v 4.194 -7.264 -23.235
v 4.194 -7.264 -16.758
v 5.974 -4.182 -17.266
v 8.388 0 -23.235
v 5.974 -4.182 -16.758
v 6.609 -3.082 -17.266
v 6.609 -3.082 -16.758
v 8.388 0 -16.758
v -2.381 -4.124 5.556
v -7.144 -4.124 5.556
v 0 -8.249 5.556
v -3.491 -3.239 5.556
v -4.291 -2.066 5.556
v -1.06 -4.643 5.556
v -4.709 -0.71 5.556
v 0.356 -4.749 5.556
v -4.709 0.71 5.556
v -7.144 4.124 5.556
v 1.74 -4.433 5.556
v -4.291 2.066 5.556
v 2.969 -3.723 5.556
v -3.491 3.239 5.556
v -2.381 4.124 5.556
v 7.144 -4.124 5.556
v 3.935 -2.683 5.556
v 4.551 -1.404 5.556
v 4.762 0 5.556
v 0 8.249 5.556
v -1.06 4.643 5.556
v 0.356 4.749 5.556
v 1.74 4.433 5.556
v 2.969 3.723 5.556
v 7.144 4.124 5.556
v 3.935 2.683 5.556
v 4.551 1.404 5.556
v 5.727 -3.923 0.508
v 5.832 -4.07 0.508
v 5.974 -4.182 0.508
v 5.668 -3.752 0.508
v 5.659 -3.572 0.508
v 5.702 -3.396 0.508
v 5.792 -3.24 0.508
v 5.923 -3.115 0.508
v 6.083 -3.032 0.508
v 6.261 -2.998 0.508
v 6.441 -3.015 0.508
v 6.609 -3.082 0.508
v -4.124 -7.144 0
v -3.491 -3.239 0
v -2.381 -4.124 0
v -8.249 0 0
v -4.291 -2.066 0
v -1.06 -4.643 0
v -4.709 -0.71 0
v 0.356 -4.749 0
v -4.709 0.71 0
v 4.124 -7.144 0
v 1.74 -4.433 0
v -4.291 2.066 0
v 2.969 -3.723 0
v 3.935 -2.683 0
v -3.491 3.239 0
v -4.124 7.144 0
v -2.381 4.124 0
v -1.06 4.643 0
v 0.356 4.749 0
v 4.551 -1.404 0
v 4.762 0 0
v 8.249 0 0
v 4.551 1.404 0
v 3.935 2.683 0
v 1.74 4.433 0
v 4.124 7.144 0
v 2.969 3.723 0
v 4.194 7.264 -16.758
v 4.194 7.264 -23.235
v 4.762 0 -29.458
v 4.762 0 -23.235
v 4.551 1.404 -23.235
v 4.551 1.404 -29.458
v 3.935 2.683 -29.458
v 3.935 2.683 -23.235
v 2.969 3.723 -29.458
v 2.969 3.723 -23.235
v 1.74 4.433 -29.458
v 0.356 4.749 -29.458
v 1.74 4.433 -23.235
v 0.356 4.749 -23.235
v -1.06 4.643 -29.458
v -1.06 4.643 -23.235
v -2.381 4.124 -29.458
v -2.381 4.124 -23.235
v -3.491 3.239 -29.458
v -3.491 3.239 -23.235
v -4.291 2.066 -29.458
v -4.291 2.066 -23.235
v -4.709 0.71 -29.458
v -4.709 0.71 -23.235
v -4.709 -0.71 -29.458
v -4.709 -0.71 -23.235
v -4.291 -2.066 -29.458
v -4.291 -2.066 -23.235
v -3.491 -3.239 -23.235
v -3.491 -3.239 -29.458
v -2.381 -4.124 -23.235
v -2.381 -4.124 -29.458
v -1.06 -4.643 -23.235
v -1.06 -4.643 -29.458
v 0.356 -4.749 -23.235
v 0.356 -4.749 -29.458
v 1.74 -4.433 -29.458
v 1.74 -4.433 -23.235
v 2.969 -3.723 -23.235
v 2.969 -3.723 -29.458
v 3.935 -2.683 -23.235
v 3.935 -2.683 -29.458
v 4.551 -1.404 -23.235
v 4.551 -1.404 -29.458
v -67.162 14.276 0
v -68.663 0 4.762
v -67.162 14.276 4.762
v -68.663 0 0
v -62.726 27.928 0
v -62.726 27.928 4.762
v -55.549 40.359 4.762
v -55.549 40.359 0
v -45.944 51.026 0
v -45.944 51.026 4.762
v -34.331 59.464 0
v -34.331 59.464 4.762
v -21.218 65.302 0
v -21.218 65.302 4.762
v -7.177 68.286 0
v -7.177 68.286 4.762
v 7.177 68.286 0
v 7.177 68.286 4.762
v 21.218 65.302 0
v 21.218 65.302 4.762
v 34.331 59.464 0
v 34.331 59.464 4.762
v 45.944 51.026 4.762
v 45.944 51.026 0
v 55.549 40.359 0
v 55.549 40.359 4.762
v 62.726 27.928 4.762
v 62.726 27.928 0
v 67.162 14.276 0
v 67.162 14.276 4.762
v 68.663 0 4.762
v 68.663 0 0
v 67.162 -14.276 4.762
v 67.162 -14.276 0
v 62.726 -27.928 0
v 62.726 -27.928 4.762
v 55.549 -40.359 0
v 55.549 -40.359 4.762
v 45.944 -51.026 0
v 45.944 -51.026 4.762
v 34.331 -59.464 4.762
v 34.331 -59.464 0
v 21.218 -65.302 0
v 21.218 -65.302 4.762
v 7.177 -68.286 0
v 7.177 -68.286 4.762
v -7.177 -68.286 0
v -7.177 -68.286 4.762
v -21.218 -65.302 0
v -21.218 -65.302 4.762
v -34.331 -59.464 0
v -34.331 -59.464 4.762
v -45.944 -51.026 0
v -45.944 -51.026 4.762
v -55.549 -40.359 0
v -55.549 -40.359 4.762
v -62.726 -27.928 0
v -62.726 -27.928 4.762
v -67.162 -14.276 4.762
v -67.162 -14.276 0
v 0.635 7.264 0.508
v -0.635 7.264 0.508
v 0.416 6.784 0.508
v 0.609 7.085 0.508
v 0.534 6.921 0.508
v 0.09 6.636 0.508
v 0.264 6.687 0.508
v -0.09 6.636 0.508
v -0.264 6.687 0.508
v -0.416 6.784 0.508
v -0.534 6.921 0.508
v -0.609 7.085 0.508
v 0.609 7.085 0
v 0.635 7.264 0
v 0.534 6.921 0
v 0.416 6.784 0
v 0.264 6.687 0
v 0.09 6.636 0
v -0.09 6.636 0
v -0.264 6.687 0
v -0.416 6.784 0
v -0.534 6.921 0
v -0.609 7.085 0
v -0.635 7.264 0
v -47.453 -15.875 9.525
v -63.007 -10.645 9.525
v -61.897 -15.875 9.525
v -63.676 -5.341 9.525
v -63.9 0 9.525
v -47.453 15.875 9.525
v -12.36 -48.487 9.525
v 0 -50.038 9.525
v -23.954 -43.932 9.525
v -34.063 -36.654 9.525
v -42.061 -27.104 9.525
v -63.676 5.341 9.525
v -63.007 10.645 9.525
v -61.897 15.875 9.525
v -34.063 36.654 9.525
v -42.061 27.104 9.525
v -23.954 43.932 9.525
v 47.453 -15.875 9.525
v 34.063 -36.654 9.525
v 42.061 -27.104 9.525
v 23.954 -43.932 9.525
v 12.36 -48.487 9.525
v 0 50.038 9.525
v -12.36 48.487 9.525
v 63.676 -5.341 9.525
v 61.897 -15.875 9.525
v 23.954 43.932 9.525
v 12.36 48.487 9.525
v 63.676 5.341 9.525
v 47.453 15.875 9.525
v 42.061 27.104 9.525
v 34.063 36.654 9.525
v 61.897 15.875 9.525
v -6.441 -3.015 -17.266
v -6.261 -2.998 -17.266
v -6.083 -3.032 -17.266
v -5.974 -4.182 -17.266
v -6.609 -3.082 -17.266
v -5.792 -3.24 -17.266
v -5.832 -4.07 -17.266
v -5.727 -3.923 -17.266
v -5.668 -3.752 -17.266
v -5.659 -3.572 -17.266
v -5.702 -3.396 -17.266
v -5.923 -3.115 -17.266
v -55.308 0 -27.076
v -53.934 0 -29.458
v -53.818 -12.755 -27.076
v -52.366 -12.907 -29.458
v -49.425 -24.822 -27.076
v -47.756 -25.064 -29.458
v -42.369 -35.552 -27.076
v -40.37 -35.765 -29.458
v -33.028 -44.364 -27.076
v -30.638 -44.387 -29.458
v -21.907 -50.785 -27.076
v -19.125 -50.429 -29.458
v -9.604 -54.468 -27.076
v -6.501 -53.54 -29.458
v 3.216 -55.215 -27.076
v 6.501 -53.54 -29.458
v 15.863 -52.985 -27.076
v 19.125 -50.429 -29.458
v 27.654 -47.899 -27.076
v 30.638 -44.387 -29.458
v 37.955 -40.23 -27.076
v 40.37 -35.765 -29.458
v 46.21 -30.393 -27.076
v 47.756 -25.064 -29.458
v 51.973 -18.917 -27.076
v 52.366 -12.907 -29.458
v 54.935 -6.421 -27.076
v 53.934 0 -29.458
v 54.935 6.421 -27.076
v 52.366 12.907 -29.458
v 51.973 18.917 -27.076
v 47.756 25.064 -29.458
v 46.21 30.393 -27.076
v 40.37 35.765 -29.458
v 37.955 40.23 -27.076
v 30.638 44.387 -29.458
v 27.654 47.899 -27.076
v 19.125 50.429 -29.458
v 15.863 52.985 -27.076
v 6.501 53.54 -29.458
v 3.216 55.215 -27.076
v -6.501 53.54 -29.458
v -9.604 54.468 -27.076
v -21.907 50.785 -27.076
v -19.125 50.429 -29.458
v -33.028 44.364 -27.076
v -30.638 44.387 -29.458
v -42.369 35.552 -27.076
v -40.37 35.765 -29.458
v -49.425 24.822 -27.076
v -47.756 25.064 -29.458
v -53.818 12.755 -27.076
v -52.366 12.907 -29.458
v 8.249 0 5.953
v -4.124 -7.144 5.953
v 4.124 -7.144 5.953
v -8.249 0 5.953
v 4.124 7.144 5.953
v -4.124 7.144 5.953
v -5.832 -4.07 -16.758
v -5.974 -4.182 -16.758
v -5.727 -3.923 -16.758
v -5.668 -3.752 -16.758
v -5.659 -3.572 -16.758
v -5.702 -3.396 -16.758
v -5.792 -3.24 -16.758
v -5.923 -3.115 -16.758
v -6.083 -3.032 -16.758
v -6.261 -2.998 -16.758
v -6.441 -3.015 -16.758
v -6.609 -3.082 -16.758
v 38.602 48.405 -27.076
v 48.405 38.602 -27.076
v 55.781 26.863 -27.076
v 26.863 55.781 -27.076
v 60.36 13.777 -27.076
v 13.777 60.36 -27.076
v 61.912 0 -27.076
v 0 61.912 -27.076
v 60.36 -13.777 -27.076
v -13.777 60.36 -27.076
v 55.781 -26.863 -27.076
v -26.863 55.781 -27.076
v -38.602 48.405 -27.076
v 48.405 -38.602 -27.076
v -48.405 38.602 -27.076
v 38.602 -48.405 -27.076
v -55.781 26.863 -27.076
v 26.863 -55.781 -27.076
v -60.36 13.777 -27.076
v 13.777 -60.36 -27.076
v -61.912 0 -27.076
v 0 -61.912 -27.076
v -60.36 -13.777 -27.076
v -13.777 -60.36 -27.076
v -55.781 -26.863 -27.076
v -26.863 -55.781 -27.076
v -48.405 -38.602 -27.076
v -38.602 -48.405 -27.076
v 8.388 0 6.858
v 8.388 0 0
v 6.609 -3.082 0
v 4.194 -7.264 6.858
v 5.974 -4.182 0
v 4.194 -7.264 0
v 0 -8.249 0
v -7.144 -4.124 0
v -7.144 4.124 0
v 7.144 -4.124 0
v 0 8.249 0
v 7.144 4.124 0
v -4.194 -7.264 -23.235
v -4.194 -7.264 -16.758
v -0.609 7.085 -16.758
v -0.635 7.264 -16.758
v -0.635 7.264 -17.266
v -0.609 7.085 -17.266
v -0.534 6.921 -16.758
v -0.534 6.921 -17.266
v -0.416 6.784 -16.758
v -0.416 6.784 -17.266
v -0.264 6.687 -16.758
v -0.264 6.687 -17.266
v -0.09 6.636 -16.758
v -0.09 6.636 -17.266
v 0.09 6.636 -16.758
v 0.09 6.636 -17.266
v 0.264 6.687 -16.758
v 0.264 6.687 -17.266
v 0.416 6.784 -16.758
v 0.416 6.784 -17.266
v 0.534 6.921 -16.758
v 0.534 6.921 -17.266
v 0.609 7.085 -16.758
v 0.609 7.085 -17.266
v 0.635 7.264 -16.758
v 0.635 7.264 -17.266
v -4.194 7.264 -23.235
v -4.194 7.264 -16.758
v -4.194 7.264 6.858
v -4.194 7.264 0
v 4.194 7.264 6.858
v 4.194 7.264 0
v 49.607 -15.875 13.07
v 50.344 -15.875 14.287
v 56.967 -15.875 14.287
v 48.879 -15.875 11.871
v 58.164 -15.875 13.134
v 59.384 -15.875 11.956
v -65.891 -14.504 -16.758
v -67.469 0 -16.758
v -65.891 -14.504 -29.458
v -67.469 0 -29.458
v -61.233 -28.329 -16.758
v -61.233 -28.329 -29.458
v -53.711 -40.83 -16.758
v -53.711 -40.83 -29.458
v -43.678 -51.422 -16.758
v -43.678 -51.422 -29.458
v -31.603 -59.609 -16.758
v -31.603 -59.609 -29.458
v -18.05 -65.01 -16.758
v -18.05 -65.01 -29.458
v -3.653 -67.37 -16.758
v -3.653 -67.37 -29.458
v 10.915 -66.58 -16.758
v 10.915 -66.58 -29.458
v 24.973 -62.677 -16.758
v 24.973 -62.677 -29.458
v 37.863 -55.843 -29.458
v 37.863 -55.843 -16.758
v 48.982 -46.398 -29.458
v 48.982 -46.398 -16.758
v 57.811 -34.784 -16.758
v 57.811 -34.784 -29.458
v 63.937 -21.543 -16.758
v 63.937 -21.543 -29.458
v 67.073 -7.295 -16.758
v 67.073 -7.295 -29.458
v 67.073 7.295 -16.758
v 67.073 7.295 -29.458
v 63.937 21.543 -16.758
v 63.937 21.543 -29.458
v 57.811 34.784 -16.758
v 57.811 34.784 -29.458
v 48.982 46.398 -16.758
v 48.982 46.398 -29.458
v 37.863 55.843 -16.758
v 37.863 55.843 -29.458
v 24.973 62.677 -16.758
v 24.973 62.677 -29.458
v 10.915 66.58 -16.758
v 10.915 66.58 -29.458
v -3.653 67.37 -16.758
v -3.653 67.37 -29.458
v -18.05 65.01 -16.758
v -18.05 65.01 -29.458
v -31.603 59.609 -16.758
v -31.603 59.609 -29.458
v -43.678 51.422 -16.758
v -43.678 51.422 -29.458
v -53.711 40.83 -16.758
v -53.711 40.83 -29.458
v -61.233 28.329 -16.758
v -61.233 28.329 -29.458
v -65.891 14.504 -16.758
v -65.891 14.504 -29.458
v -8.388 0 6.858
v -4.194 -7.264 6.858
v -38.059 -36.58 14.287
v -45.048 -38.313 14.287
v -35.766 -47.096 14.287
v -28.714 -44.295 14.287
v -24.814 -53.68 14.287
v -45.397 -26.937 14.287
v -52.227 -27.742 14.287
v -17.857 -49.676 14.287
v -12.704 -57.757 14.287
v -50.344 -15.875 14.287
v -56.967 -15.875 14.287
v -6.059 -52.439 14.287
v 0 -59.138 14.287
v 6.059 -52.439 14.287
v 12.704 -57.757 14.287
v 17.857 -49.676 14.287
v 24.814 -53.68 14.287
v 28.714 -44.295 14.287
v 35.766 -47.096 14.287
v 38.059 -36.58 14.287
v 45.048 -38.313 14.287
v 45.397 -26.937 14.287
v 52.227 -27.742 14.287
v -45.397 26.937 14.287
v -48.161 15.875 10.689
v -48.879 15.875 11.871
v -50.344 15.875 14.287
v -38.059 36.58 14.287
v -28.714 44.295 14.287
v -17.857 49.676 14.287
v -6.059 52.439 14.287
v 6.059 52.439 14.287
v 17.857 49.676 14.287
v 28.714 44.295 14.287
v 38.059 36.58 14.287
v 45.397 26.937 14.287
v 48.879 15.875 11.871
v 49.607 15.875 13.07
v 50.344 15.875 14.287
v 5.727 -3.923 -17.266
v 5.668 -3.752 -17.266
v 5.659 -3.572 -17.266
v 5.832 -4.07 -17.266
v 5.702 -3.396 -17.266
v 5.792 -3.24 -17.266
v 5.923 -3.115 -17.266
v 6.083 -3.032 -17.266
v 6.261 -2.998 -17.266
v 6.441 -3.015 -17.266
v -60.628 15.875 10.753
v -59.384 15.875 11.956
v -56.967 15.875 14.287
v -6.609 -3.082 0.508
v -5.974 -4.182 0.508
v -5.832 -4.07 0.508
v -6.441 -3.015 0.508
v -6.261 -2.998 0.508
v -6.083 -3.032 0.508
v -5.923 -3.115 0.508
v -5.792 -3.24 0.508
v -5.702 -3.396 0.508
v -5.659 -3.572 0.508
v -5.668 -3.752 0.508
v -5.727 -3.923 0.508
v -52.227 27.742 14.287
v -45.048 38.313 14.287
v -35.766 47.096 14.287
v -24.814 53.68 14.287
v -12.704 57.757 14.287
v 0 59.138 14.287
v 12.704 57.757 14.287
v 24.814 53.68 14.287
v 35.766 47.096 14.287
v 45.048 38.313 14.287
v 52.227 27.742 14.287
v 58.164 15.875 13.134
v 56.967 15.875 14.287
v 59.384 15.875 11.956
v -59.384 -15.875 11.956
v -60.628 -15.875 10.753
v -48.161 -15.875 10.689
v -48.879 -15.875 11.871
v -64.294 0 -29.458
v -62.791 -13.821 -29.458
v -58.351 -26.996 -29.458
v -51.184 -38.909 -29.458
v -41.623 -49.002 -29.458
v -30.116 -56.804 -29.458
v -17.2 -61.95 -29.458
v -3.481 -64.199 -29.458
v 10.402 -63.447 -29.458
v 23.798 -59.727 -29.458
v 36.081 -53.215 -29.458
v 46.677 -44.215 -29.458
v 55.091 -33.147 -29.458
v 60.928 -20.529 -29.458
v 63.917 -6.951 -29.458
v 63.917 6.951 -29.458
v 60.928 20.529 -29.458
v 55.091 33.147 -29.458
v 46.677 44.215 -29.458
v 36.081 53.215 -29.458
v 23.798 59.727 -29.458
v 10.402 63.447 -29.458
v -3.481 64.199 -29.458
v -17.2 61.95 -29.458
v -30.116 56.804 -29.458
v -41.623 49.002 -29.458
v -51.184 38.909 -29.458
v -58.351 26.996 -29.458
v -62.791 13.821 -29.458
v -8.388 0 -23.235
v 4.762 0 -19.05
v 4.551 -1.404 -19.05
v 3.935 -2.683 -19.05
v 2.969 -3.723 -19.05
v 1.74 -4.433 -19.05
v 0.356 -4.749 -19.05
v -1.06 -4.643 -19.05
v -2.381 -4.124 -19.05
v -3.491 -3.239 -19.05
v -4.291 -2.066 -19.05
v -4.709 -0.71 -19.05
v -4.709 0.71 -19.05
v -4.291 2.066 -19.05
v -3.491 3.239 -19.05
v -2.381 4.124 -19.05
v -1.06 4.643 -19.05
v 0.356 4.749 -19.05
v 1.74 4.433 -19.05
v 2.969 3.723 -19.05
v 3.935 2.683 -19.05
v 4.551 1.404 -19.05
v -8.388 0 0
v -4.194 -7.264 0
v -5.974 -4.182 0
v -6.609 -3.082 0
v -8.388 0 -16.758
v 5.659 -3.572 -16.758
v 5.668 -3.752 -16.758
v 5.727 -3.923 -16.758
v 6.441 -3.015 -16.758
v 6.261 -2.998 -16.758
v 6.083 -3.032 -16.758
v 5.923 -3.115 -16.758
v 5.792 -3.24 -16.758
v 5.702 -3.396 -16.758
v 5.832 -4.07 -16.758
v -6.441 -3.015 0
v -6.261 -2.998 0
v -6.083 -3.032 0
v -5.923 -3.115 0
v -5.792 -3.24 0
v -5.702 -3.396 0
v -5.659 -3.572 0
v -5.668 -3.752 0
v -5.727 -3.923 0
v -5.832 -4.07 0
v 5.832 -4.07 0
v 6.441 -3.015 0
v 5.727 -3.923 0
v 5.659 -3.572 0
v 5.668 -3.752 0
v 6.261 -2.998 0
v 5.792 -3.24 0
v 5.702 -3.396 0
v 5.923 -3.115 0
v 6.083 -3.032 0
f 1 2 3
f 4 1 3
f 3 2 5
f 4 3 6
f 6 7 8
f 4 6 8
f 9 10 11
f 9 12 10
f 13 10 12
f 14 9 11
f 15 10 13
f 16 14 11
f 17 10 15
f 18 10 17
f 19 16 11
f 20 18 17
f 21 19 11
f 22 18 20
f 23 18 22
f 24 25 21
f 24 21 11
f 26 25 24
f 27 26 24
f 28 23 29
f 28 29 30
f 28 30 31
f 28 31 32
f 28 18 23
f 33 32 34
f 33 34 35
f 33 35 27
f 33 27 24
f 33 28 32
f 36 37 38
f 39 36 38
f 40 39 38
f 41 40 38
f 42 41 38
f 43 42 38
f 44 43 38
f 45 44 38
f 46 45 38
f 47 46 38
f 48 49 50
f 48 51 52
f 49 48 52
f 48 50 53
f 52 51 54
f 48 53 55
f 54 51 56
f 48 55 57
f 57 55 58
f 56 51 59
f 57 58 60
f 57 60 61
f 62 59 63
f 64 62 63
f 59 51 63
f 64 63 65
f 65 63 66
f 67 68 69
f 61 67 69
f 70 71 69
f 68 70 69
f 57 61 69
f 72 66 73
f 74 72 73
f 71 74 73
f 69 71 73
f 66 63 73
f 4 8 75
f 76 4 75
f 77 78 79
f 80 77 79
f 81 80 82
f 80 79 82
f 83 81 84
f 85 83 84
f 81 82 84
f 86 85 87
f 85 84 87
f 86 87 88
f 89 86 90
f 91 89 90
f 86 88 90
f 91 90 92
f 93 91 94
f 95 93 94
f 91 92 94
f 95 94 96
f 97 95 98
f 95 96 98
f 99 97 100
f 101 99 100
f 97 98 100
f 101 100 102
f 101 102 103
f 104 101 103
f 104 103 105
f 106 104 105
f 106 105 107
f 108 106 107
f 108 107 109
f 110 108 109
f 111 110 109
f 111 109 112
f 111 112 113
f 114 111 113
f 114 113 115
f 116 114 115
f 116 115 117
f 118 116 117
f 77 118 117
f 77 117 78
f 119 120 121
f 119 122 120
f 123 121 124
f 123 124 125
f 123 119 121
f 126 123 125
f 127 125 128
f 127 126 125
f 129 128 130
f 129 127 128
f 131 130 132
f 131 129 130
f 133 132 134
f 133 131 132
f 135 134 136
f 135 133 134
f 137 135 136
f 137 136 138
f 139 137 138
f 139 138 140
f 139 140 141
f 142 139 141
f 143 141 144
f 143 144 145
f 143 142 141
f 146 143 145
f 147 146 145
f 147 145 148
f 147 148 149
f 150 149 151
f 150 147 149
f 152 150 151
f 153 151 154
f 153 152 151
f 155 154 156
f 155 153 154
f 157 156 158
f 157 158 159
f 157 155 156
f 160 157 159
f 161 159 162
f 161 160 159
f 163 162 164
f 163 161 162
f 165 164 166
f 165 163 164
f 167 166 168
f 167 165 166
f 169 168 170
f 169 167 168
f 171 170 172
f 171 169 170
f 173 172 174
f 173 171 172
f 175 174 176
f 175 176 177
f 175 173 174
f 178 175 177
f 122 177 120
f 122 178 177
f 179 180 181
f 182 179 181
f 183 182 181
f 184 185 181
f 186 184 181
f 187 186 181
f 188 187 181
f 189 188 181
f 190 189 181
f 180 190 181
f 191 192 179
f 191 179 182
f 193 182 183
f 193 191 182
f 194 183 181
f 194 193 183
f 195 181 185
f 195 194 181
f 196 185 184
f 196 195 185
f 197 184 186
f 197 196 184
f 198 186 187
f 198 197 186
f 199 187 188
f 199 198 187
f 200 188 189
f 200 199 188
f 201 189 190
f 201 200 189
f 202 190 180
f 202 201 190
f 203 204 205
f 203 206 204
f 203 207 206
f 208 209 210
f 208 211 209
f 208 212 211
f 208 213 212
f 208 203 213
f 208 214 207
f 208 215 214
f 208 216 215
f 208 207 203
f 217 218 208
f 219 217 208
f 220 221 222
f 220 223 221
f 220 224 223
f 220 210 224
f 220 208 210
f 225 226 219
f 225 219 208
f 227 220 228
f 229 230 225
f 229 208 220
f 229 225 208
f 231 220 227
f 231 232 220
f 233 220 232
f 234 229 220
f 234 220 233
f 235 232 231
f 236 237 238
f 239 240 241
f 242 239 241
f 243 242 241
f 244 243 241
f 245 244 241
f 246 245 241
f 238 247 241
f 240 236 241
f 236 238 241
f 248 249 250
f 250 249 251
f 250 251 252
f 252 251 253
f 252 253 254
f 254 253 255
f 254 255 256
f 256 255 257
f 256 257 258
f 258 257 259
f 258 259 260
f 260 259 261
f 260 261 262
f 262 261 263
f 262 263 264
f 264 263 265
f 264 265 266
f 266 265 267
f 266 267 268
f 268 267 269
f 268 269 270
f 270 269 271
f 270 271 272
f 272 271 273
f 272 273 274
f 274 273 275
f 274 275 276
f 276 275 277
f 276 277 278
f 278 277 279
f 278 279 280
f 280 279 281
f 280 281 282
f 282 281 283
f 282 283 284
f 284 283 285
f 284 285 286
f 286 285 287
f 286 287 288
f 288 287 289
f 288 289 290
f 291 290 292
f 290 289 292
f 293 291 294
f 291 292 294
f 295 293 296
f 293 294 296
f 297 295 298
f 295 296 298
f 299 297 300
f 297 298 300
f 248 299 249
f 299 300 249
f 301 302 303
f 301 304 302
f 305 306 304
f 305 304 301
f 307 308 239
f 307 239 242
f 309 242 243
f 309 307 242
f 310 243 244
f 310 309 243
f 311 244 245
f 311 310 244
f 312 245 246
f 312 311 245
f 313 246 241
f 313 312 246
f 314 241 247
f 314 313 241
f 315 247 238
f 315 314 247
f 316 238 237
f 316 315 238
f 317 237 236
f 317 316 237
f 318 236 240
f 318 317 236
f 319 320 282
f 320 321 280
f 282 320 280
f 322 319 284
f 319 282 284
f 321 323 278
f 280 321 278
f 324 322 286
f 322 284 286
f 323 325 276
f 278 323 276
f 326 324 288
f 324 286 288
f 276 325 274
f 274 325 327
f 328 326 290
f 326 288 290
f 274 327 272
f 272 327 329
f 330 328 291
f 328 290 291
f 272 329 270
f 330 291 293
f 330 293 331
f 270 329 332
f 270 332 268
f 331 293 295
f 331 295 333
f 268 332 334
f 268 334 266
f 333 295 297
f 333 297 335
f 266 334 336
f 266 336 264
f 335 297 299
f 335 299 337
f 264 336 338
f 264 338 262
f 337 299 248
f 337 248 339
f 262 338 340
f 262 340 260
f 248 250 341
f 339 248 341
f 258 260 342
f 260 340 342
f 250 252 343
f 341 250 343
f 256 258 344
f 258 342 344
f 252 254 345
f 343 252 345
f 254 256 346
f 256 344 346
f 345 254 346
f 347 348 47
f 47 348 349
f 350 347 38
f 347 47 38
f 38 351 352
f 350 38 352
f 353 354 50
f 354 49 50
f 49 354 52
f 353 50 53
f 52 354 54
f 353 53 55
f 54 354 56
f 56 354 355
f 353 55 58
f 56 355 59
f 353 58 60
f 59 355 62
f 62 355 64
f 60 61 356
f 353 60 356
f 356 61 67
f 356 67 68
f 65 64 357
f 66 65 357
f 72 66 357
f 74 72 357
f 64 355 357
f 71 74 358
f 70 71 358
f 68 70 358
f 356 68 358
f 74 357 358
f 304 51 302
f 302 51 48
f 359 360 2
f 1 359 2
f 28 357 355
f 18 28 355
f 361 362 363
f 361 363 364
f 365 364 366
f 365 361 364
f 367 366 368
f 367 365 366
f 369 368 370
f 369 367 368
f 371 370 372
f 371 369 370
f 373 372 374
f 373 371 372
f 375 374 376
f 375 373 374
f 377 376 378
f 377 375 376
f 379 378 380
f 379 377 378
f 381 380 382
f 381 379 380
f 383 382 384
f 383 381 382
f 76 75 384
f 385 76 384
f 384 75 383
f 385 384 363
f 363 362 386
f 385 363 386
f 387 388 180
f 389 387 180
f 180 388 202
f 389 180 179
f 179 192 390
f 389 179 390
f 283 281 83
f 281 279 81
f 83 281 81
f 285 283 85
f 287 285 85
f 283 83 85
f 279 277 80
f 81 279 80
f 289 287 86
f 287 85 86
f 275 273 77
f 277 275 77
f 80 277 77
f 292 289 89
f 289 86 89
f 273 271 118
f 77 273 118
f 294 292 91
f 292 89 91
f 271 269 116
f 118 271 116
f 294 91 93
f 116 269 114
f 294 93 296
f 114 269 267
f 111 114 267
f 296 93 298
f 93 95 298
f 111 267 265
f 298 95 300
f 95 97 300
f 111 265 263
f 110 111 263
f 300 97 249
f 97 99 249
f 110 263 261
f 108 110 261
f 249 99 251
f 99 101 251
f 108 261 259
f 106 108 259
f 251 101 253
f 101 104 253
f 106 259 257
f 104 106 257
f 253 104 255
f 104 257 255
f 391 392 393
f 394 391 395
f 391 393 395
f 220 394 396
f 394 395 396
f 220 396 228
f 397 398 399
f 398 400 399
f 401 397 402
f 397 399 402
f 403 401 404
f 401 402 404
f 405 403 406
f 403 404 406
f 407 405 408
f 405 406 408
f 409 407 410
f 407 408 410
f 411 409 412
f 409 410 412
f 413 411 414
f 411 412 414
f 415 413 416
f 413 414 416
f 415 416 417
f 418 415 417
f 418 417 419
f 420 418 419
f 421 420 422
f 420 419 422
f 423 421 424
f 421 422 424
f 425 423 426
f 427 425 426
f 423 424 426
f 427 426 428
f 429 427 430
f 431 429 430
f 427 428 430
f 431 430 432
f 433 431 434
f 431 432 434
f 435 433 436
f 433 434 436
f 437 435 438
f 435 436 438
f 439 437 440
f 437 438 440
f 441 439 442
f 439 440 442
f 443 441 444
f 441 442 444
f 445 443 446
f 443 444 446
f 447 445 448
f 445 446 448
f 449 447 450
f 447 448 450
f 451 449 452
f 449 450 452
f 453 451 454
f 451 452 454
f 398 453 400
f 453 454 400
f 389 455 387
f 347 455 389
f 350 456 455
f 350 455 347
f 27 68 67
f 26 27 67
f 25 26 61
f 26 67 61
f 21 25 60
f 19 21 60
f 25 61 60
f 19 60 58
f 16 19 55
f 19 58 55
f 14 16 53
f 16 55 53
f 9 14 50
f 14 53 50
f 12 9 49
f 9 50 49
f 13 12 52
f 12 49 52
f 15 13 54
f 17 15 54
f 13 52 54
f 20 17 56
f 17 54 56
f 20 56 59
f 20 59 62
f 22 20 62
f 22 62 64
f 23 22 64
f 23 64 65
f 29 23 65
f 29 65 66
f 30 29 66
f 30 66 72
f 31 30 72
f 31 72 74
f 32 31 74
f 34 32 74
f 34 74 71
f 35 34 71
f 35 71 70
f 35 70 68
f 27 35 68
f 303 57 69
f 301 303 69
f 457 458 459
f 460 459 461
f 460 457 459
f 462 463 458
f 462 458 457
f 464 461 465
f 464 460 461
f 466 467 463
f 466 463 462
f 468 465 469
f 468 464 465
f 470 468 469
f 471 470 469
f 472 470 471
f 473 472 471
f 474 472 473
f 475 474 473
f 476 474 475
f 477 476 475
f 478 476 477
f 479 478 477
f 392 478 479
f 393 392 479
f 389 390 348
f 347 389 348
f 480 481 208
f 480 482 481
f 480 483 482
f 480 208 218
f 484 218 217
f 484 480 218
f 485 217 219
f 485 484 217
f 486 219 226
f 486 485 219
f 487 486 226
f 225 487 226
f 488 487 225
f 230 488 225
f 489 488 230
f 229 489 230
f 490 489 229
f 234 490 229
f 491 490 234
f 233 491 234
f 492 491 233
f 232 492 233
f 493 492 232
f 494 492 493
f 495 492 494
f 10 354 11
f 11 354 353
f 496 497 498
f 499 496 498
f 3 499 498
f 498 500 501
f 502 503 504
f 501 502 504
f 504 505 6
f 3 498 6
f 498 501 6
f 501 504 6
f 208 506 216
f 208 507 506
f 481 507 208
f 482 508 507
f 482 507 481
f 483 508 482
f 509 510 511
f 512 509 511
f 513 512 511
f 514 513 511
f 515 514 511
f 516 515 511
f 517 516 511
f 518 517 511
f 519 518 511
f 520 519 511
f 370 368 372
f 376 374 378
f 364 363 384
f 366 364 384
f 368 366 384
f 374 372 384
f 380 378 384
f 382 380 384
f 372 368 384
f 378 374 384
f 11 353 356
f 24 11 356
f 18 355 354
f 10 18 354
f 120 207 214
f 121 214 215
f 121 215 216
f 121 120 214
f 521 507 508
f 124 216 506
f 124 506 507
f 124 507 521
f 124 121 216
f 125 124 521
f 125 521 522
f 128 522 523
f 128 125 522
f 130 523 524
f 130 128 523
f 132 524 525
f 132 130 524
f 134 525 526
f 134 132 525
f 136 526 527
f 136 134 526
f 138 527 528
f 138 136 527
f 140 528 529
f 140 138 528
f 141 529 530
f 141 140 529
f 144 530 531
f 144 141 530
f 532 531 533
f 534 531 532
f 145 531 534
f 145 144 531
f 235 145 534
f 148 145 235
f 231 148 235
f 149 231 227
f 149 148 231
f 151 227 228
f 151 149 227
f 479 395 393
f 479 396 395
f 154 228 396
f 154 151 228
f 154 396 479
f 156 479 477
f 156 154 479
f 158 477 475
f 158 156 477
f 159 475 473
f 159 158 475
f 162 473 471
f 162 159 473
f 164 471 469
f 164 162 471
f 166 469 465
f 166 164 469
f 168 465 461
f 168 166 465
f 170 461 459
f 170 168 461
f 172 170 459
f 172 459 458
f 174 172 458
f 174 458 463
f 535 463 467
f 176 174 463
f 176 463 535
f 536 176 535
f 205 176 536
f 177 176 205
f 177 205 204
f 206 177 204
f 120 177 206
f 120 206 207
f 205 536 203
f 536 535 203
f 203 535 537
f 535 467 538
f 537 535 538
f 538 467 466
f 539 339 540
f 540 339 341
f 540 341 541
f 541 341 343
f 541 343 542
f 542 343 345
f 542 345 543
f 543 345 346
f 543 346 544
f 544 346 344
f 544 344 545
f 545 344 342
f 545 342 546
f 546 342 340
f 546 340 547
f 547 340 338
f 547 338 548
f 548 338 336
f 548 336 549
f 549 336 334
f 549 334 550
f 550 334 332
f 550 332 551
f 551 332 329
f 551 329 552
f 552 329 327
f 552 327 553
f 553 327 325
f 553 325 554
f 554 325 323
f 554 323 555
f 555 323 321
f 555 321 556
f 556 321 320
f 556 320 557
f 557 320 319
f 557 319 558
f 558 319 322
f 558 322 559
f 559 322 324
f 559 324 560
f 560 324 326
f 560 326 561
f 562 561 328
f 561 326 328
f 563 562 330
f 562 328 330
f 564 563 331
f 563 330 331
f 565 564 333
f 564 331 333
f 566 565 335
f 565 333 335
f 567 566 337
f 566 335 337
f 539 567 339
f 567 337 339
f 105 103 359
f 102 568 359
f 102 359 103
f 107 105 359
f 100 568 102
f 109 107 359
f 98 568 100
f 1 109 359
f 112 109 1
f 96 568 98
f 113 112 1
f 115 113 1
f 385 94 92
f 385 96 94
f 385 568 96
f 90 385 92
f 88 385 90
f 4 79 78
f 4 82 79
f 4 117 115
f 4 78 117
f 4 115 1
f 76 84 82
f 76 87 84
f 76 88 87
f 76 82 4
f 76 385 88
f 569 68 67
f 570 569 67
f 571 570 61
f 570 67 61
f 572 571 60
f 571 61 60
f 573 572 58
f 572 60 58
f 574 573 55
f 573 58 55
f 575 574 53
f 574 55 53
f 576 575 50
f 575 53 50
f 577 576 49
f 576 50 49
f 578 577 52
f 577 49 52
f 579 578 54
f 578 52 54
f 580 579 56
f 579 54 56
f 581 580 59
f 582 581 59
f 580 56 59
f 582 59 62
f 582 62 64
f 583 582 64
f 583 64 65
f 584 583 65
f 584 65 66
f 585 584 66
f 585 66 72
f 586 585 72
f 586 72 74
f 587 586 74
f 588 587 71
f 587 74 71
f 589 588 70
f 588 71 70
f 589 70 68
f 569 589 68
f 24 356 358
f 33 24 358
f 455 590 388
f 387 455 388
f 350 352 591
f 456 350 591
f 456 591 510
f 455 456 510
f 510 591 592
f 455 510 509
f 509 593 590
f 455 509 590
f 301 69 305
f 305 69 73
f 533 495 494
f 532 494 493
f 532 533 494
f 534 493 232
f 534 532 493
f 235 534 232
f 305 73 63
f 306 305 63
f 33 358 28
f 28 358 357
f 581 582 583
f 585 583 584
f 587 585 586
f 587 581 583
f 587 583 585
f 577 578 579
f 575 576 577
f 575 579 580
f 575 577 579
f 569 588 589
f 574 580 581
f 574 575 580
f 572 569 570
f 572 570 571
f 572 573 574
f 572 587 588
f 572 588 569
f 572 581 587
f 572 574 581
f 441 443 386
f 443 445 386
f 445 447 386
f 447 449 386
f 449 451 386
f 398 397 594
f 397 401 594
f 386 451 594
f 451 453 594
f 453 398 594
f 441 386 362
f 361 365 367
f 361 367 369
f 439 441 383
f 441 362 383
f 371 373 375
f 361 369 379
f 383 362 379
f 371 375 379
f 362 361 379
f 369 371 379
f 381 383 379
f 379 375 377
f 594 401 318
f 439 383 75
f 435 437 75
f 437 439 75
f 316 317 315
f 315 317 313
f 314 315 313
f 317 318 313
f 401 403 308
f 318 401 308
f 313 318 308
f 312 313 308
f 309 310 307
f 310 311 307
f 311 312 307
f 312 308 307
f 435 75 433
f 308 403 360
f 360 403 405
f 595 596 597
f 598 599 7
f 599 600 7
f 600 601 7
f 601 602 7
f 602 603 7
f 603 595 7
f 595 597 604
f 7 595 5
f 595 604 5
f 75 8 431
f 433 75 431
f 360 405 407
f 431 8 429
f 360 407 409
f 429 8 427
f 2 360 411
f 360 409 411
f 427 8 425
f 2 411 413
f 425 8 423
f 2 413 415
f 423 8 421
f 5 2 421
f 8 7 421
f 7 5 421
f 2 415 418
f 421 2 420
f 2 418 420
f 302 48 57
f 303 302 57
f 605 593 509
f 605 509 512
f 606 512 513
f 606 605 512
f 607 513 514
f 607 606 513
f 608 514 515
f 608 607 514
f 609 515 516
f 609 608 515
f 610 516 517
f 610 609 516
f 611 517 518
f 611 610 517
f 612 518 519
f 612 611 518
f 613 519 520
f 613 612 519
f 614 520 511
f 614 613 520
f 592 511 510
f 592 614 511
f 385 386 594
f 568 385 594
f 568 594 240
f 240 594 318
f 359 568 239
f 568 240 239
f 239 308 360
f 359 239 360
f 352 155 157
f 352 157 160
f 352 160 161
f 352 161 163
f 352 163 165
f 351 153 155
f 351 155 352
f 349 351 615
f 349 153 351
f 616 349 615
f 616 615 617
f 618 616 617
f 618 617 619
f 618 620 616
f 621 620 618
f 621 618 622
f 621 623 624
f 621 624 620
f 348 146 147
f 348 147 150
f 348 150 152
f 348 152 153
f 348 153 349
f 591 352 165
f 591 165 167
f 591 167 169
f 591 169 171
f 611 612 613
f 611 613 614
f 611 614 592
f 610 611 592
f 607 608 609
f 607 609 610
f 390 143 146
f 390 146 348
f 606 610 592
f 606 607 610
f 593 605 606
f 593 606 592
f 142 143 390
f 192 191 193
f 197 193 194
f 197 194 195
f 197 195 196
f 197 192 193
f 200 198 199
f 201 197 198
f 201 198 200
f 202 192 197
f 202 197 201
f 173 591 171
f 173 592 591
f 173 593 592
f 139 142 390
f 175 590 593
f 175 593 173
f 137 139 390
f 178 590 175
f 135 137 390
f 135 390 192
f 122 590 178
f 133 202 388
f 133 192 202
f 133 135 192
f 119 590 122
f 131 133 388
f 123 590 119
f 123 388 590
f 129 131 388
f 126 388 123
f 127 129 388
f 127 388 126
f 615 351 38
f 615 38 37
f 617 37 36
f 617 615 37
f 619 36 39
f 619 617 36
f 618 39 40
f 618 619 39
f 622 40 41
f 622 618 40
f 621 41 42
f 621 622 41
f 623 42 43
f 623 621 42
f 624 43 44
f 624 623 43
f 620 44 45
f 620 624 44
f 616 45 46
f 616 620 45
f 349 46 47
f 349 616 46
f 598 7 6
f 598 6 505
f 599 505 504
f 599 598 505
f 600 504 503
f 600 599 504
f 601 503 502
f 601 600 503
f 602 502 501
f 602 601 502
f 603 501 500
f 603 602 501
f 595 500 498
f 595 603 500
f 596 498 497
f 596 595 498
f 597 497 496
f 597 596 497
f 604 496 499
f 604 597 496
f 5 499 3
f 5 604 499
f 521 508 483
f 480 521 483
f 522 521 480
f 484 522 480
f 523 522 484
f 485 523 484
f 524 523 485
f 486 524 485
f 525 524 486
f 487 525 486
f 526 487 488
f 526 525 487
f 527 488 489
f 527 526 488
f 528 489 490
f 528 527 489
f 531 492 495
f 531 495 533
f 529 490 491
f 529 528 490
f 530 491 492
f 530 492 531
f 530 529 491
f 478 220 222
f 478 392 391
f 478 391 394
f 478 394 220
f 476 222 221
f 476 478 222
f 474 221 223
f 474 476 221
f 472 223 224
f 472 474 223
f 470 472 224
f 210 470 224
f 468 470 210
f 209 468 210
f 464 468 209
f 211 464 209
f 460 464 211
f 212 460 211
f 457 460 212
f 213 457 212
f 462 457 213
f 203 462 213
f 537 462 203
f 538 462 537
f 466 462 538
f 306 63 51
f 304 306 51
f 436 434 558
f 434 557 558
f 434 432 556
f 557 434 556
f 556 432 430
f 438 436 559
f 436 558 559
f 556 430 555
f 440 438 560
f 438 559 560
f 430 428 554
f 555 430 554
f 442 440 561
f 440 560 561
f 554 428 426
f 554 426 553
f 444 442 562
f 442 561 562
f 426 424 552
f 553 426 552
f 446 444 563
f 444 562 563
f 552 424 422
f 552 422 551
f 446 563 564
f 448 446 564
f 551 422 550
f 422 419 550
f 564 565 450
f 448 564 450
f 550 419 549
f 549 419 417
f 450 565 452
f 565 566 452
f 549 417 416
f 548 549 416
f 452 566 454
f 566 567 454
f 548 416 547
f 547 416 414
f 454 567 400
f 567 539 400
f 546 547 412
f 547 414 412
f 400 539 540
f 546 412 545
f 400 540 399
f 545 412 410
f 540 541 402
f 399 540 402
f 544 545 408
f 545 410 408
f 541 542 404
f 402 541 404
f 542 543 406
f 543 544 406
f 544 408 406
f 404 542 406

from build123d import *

# Parameters (mm, degrees)
F5_DEPTH  = 6.858
F7_DEPTH  = 6.477
F8_R      = 4.7625
F9_DEPTH  = 12.701
F10_W     = 165.1
F10_H     = 31.75
F11_DEPTH = 4.7625
F13_DEPTH = 0.508
F15_DEPTH = 0.508
F17_DEPTH = 5.953125
F18_R     = 4.7625
F19_DEPTH = 19.05
F21_DEPTH = 5.55625
F22_R     = 4.7625
F23_DEPTH = 14.2885


with BuildPart() as f1:
    # F0 (on Front) → F1 (revolve)
    with BuildSketch(Plane.XZ):
        Polygon((-59.137630657, 14.2875), (-68.662630657, 4.7625), (-68.662630657, 0), (0, 0), (0, 9.525), (-50.038, 9.525), (-52.787630657, 14.2875), align=None)
    revolve(axis=Axis((0, 0, 4.7625), (0, 0, -1)))

    # F4 (on face) → F5 (cut)
    with BuildSketch(Plane(origin=(0, 0, 0), x_dir=(1, 0, 0), z_dir=(0, 0, -1))):
        Polygon((-4.1941032955, -7.2644), (4.1941032955, -7.2644), (8.388206591, 0), (4.1941032955, 7.2644), (-4.1941032955, 7.2644), (-8.388206591, 0), align=None)
    extrude(amount=-F5_DEPTH, mode=Mode.SUBTRACT)

    # F10 (on face) → F11 (cut)
    with BuildSketch(Plane.XY.offset(14.2875)):
        Rectangle(F10_W, F10_H)
    extrude(amount=-F11_DEPTH, mode=Mode.SUBTRACT)

    # F12 (on face) → F13 (join)
    with BuildSketch(Plane(origin=(0, 0, 0), x_dir=(1, 0, 0), z_dir=(0, 0, -1))):
        with BuildLine():
            Line((-5.9736549433, 4.1821261314), (-6.6086549433, 3.0822738686))
            ThreePointArc((-6.6086549433, 3.0822738686), (-5.7412288118, 3.3147), (-5.9736549433, 4.1821261314))
        make_face()
        with BuildLine():
            Line((-0.635, -7.2644), (0.635, -7.2644))
            ThreePointArc((0.635, -7.2644), (0, -6.6294), (-0.635, -7.2644))
        make_face()
        with BuildLine():
            Line((6.6086549433, 3.0822738686), (5.9736549433, 4.1821261314))
            ThreePointArc((5.9736549433, 4.1821261314), (5.7412288118, 3.3147), (6.6086549433, 3.0822738686))
        make_face()
    extrude(amount=-F13_DEPTH)


with BuildPart() as f3:
    # F2 (on Front) → F3 (revolve)
    with BuildSketch(Plane.XZ):
        Polygon((0, -29.4575945771), (0, -16.7575945771), (-67.46875, -16.7575945771), (-67.46875, -29.4575945771), (-64.29375, -29.4575945771), (-61.9125, -27.0763445771), (-55.3085, -27.0763445771), (-53.9336846715, -29.4575945771), align=None)
    revolve(axis=Axis((0, 0, -23.1075945771), (0, 0, 1)))

    # F6 (on face) → F7 (cut)
    with BuildSketch(Plane.XY.offset(-16.7575945771)):
        Polygon((-4.1941032955, -7.2644), (4.1941032955, -7.2644), (8.388206591, 0), (4.1941032955, 7.2644), (-4.1941032955, 7.2644), (-8.388206591, 0), align=None)
    extrude(amount=-F7_DEPTH, mode=Mode.SUBTRACT)

    # F8 (on face) → F9 (cut, through all)
    with BuildSketch(Plane.XY.offset(-16.7575945771)):
        Circle(F8_R)
    extrude(amount=-F9_DEPTH, mode=Mode.SUBTRACT)

    # F14 (on face) → F15 (join)
    with BuildSketch(Plane.XY.offset(-16.7575945771)):
        with BuildLine():
            Line((-6.6086549433, -3.0822738686), (-5.9736549433, -4.1821261314))
            ThreePointArc((-5.9736549433, -4.1821261314), (-5.7412288118, -3.3147), (-6.6086549433, -3.0822738686))
        make_face()
        with BuildLine():
            Line((5.9736549433, -4.1821261314), (6.6086549433, -3.0822738686))
            ThreePointArc((6.6086549433, -3.0822738686), (5.7412288118, -3.3147), (5.9736549433, -4.1821261314))
        make_face()
        with BuildLine():
            Line((0.635, 7.2644), (-0.635, 7.2644))
            ThreePointArc((-0.635, 7.2644), (0, 6.6294), (0.635, 7.2644))
        make_face()
    extrude(amount=-F15_DEPTH)


with BuildPart() as f17:
    # F16 (on Top) → F17 (new body)
    with BuildSketch(Plane.XY):
        Polygon((-4.1244459855, -7.14375), (4.1244459855, -7.14375), (8.248891971, 0), (4.1244459855, 7.14375), (-4.1244459855, 7.14375), (-8.248891971, 0), align=None)
    extrude(amount=F17_DEPTH)

    # F18 (on face) → F19 (join)
    with BuildSketch(Plane(origin=(0, 0, 0), x_dir=(1, 0, 0), z_dir=(0, 0, -1))):
        Circle(F18_R)
    extrude(amount=F19_DEPTH)


with BuildPart() as f21:
    # F20 (on Top) → F21 (new body)
    with BuildSketch(Plane.XY):
        Polygon((7.14375, -4.1244459855), (7.14375, 4.1244459855), (0, 8.248891971), (-7.14375, 4.1244459855), (-7.14375, -4.1244459855), (0, -8.248891971), align=None)
    extrude(amount=F21_DEPTH)

    # F22 (on face) → F23 (cut, through all)
    with BuildSketch(Plane(origin=(0, 0, 0), x_dir=(1, 0, 0), z_dir=(0, 0, -1))):
        Circle(F22_R)
    extrude(amount=-F23_DEPTH, mode=Mode.SUBTRACT)


solid = Compound([f1.part, f3.part, f17.part, f21.part])
